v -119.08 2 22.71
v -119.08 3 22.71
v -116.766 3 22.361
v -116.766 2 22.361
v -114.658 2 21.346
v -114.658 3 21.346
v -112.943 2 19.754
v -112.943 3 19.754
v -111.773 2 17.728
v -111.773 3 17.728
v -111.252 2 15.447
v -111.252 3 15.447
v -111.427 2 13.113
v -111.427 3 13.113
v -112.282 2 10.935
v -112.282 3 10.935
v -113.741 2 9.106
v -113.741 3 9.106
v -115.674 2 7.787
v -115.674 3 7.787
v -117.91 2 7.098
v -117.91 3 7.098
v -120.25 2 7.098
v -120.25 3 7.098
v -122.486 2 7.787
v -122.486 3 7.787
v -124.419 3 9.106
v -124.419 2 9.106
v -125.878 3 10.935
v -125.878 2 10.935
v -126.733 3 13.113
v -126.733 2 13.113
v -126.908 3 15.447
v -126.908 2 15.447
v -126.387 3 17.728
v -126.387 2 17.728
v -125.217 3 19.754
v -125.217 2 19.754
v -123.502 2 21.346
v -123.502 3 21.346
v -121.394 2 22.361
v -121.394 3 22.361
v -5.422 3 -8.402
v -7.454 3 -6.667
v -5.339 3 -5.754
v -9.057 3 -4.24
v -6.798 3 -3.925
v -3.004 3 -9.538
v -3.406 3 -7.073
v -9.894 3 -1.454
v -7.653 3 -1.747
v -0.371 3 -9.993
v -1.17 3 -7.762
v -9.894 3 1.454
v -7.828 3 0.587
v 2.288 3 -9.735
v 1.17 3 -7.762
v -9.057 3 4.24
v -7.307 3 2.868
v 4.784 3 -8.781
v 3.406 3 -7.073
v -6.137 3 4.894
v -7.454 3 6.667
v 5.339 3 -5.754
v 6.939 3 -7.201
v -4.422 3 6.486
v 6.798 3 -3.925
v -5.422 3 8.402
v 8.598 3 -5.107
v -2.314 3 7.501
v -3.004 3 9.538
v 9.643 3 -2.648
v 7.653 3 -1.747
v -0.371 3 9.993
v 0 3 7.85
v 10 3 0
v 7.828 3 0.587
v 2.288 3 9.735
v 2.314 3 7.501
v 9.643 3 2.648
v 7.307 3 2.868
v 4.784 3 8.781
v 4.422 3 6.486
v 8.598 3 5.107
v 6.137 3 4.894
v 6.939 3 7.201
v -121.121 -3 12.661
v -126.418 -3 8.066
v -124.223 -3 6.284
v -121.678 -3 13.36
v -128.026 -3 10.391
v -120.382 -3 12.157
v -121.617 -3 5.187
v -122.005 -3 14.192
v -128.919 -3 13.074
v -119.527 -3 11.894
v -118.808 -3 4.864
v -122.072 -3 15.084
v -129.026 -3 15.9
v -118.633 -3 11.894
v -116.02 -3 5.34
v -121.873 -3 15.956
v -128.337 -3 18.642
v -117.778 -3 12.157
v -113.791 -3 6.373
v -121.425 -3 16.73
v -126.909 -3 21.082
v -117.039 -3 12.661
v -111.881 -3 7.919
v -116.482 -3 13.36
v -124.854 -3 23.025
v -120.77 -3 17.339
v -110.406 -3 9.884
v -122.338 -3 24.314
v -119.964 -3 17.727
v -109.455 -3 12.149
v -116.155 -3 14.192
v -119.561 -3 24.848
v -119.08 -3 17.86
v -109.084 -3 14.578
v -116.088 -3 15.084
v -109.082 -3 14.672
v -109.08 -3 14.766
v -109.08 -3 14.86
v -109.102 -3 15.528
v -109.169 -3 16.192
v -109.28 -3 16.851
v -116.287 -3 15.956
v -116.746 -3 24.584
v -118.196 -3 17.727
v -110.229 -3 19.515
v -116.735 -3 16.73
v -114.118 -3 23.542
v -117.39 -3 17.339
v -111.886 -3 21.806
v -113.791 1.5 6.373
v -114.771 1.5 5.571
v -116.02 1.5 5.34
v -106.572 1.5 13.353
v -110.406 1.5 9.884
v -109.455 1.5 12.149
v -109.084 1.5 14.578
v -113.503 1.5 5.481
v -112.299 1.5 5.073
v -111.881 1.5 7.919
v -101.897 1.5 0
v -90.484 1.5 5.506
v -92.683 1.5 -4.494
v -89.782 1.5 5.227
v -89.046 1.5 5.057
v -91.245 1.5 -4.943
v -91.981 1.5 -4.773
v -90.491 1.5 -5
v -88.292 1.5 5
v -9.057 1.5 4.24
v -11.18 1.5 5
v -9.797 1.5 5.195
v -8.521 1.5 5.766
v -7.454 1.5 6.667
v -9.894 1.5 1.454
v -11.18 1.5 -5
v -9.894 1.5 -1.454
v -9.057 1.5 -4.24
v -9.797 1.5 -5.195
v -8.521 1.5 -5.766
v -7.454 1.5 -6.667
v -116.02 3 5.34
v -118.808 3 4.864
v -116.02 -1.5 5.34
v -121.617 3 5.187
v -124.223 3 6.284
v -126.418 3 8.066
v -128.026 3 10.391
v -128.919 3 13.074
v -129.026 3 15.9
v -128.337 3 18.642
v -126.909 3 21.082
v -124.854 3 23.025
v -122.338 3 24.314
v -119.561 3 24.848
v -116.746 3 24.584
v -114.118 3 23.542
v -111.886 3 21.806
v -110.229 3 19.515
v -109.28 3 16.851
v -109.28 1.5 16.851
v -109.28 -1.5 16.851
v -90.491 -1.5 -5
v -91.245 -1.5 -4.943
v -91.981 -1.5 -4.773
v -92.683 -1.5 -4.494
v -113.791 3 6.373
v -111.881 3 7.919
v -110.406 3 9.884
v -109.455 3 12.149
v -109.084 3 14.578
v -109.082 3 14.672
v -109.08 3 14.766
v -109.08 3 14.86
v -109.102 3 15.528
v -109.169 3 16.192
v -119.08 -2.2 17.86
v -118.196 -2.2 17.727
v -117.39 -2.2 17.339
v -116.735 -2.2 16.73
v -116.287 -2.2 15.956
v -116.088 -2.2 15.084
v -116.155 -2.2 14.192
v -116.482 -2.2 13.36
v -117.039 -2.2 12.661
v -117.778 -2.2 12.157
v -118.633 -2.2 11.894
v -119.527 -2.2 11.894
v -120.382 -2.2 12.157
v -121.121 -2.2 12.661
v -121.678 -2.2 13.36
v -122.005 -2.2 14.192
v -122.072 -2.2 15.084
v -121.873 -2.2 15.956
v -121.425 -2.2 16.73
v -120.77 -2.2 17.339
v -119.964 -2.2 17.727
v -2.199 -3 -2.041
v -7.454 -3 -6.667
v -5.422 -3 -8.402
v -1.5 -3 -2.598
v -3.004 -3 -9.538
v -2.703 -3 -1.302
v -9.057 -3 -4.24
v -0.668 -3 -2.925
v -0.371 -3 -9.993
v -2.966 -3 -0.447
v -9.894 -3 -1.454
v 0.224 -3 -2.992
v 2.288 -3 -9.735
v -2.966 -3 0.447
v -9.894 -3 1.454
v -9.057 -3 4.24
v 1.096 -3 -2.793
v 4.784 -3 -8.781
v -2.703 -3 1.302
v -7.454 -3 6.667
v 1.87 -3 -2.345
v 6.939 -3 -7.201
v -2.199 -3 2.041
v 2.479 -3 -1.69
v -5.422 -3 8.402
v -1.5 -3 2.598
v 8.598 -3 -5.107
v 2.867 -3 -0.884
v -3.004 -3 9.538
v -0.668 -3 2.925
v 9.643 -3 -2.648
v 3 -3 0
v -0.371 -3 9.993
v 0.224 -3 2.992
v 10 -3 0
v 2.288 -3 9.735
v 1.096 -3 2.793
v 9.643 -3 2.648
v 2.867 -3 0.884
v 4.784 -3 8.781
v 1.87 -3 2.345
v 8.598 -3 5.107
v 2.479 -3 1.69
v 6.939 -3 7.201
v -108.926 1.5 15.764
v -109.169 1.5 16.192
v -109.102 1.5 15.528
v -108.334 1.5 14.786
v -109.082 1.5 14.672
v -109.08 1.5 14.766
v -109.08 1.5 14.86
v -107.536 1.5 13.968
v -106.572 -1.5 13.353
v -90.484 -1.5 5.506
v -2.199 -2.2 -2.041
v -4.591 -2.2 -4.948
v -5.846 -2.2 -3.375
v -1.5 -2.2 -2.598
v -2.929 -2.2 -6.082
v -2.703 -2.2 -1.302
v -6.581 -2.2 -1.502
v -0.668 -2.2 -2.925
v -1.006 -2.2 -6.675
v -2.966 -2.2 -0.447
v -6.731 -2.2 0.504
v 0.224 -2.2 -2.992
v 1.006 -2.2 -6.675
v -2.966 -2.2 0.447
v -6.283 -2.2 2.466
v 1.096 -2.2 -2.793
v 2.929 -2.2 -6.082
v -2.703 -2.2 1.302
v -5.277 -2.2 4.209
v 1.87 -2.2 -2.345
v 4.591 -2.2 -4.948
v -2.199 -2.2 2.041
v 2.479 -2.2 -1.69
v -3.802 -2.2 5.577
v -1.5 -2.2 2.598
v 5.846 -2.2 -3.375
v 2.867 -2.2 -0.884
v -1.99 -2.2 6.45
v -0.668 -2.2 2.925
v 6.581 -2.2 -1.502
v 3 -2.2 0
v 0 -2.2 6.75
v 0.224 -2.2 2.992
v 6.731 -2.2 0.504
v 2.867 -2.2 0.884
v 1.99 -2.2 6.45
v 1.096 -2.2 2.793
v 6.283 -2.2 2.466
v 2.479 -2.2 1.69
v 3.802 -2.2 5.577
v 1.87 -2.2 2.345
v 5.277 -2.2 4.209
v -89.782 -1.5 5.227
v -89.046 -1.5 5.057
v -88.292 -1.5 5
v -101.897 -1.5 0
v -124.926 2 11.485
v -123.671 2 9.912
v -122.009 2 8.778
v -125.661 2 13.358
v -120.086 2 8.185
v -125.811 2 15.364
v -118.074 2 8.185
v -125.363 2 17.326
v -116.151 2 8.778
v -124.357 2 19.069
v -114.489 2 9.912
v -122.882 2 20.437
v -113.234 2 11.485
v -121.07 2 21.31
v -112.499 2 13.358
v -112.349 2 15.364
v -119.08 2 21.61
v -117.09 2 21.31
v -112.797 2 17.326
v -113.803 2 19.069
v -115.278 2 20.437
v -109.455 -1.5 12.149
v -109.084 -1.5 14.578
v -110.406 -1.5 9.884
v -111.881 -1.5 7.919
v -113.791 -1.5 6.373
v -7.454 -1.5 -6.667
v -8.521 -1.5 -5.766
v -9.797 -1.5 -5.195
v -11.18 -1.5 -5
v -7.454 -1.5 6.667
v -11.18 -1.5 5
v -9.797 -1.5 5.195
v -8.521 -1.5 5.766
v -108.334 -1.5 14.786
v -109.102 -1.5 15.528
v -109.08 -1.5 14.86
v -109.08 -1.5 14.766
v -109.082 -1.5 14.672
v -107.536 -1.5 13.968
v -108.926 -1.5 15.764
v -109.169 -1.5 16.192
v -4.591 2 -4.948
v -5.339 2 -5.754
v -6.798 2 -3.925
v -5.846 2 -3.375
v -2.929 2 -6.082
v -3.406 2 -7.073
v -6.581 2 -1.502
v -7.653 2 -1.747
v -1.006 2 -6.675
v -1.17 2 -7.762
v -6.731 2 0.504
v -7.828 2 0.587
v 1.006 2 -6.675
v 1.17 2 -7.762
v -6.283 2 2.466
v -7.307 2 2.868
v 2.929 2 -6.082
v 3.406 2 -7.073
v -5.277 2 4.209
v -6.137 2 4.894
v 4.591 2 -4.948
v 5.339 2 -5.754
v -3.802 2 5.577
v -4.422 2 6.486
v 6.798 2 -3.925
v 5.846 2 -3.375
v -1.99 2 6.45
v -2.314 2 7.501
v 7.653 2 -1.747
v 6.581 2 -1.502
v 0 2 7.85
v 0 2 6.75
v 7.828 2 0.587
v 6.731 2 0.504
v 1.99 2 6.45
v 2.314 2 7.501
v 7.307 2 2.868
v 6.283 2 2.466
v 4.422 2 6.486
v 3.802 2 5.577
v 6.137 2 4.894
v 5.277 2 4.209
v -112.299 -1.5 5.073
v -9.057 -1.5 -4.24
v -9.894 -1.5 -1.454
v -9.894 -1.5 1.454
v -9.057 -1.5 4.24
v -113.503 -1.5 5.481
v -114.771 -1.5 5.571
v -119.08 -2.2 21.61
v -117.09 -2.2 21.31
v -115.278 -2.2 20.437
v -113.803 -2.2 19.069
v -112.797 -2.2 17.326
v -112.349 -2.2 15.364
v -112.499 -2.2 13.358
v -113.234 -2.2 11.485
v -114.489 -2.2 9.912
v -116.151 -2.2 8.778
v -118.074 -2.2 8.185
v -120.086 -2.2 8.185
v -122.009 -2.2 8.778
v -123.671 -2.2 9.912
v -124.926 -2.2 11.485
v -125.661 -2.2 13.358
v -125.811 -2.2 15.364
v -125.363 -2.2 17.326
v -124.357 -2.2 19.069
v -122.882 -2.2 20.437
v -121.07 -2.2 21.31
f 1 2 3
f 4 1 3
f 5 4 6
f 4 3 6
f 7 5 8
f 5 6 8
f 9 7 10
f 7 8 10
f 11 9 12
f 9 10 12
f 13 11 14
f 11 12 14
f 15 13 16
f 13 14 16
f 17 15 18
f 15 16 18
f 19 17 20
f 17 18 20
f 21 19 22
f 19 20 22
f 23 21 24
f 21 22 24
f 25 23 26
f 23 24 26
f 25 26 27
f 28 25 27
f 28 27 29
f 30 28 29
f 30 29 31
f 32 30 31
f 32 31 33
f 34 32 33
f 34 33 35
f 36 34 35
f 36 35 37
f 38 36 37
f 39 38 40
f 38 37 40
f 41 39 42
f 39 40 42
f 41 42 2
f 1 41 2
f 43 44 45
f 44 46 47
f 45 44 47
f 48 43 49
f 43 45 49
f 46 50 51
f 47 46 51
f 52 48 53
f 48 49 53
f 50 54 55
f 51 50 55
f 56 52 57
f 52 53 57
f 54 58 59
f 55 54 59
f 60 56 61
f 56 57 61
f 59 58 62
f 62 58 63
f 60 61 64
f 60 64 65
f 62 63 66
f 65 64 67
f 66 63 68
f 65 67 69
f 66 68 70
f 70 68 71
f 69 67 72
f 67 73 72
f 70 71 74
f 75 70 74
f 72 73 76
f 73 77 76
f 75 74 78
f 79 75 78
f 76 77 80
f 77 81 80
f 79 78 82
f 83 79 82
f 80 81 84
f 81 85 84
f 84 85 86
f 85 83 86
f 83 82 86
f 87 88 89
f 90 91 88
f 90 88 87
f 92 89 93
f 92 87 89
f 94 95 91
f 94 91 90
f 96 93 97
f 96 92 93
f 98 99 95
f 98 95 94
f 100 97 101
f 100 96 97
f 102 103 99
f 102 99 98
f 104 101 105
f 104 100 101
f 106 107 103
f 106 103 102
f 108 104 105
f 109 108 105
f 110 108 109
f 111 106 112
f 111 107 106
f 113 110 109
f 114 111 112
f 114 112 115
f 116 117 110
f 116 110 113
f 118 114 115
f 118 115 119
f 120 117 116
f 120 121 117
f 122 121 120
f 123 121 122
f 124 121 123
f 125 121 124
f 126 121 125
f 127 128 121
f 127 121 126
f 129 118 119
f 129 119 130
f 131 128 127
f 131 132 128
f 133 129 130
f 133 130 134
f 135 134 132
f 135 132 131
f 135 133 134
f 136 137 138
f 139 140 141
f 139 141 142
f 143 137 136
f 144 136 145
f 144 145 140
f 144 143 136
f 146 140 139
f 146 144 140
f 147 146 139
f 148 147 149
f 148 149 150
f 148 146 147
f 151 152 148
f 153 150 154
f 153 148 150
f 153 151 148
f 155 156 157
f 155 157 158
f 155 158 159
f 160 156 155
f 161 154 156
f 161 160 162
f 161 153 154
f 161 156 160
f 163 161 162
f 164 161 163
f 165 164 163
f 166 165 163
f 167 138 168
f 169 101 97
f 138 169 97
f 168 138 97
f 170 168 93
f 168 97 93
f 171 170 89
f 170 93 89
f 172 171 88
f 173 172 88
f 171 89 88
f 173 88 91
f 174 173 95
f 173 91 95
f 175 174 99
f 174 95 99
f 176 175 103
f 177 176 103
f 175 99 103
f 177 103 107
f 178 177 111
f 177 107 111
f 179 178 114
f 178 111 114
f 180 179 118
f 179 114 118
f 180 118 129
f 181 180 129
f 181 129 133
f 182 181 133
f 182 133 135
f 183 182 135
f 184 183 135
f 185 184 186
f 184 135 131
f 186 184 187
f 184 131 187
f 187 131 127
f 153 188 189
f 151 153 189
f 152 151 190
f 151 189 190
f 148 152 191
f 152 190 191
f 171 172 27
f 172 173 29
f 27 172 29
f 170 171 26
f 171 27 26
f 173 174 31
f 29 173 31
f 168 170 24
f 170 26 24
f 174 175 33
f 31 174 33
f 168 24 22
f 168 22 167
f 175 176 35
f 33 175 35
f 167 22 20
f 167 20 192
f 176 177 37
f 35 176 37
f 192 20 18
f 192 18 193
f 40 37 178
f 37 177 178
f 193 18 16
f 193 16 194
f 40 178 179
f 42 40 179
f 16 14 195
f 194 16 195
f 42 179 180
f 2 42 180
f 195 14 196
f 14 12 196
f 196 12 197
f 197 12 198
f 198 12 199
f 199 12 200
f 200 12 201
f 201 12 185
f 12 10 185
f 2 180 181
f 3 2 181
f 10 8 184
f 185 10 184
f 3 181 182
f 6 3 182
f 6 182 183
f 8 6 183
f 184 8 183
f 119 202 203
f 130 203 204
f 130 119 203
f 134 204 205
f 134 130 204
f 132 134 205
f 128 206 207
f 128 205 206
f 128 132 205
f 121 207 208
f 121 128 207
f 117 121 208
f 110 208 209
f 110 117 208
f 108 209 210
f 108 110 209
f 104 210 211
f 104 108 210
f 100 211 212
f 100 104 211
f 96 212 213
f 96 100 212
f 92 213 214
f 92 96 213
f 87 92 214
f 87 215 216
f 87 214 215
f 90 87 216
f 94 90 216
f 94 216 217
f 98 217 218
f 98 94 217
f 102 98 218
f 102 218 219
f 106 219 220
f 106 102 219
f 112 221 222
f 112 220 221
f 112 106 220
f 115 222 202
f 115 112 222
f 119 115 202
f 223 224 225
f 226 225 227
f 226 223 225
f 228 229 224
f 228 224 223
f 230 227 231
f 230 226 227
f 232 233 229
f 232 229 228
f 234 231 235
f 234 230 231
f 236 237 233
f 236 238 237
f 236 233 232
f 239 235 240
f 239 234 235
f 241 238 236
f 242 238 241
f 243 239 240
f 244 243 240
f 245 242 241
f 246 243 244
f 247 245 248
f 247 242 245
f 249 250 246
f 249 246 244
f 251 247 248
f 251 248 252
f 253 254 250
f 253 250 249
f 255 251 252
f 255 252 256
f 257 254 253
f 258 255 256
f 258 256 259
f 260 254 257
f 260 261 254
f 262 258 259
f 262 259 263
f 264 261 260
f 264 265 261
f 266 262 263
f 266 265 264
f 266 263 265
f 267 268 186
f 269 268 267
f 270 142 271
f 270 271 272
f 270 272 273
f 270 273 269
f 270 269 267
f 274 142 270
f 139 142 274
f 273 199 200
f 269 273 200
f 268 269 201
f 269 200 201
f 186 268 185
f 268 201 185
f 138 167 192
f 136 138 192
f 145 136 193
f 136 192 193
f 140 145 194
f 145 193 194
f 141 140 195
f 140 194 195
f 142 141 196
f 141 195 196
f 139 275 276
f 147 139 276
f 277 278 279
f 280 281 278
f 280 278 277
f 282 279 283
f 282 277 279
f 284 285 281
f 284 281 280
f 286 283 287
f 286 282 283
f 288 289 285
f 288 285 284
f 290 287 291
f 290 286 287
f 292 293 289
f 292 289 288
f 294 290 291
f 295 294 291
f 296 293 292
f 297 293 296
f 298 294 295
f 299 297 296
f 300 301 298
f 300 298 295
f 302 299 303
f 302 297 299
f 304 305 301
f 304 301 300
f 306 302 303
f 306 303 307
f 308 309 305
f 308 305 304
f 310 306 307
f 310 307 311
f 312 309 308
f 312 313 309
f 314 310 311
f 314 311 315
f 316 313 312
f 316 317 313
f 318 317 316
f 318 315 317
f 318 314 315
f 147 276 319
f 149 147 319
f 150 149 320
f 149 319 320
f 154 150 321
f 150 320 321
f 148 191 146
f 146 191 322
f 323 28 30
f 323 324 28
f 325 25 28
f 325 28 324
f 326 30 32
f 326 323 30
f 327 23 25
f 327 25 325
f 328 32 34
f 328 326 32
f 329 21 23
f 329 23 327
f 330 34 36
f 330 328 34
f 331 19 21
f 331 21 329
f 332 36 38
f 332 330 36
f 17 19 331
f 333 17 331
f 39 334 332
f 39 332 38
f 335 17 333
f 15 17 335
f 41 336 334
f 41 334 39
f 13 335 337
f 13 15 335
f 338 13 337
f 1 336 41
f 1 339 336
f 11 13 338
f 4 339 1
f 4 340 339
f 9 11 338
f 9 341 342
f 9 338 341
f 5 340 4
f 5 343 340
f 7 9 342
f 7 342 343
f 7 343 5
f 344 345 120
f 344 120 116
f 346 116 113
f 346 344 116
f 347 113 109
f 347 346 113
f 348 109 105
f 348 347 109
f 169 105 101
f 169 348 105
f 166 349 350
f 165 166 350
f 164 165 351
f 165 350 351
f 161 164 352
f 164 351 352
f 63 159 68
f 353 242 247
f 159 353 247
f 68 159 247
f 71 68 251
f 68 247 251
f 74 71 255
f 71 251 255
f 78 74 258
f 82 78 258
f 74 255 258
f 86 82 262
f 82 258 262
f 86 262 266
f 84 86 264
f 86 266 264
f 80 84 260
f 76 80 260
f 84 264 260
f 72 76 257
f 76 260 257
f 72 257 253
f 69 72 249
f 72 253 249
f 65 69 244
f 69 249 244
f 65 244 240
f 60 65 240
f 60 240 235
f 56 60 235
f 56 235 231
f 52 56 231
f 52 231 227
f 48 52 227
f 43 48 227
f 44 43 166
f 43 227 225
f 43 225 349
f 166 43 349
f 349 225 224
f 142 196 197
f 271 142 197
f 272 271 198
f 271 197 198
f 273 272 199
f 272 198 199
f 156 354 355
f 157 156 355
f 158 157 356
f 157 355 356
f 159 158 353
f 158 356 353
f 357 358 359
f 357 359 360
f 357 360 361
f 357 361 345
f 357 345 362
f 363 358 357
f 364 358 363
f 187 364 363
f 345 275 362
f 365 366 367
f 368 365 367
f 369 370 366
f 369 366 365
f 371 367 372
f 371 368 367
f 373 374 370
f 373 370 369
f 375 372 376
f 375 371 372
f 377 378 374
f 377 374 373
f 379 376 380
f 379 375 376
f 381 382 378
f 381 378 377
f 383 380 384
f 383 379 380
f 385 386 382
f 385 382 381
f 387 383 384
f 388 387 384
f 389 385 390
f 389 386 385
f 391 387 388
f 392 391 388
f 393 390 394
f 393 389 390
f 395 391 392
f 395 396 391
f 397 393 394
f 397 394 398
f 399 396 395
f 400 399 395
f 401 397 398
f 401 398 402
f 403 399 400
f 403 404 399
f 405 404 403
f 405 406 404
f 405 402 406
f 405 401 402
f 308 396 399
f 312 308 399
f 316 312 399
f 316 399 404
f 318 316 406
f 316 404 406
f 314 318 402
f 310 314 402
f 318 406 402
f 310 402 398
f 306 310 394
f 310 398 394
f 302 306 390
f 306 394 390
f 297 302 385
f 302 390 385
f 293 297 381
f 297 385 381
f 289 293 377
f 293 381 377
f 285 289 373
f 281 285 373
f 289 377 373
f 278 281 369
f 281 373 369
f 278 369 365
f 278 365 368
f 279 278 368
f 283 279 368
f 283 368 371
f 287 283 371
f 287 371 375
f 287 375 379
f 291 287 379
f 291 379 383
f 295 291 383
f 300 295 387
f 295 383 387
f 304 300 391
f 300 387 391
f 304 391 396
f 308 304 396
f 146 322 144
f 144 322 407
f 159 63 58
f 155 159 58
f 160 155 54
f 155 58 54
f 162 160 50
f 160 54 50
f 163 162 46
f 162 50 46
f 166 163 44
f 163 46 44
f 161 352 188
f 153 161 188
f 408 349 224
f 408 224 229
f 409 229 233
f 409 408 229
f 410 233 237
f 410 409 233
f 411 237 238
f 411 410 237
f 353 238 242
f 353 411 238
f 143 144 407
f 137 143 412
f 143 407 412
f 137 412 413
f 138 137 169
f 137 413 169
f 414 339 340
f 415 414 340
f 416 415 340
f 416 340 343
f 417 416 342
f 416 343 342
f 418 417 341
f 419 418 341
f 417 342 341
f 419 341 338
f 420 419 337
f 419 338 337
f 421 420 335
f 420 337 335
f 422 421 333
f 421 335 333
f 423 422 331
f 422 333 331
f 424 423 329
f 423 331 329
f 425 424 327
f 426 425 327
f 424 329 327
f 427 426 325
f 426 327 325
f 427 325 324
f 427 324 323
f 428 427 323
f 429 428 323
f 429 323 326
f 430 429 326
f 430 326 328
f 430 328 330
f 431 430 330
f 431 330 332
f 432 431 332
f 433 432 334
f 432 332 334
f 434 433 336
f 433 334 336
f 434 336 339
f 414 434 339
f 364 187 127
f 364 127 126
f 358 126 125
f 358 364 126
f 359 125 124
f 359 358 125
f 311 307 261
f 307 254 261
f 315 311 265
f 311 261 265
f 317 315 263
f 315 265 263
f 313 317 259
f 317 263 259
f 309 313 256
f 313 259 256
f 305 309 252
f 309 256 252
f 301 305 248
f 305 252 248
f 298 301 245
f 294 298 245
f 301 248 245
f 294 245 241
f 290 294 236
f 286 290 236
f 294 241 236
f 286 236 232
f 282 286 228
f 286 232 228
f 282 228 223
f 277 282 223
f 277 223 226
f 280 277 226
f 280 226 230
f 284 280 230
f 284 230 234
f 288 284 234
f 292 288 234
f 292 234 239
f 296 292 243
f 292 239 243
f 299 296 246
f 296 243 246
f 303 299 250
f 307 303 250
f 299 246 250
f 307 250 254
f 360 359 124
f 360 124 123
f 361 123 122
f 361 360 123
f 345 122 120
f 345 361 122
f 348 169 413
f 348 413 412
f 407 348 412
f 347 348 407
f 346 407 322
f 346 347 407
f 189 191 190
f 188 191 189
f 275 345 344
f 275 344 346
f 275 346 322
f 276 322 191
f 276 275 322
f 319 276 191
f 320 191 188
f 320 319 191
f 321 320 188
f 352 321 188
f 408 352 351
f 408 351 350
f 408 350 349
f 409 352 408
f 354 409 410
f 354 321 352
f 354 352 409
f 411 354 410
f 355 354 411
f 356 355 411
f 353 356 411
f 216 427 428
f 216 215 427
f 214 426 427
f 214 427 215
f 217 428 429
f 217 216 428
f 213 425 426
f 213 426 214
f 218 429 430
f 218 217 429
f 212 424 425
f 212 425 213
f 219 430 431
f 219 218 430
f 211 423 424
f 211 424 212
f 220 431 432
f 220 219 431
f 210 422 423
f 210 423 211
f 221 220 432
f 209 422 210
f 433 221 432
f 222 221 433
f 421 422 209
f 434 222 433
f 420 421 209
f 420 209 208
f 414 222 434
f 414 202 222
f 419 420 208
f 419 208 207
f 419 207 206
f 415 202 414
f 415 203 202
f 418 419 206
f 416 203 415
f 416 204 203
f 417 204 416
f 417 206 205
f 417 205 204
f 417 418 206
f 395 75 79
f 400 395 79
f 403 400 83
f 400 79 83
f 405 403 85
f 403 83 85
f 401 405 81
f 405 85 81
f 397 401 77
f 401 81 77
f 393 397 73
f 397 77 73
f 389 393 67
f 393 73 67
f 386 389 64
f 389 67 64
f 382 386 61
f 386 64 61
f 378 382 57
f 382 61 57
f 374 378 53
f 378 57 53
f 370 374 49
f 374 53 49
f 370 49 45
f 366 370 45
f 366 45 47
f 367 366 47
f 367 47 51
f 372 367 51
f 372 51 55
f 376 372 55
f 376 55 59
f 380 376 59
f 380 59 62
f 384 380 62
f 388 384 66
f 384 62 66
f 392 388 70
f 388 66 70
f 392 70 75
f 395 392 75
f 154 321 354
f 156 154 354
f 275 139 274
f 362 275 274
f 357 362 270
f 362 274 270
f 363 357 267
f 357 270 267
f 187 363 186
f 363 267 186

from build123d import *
from build123d.topology import SkipClean

# Parameters (mm, degrees)
SKETCH1_R           = 7.85
SKETCH1_R_2         = 3
BOSS_EXTRUDE1_DEPTH = 3
BOSS_EXTRUDE2_START = -6
BOSS_EXTRUDE2_DEPTH = 6
CUT_EXTRUDE1_DEPTH  = 1.5
CUT_EXTRUDE3_START  = -1.5
CUT_EXTRUDE3_DEPTH  = 1.5
SKETCH6_R           = 7.85
CUT_EXTRUDE4_DEPTH  = 1
SKETCH7_R           = 6.75
CUT_EXTRUDE5_DEPTH  = 4.2


with BuildPart() as part:
    # Sketch1 → Boss-Extrude1 (new, symmetric)
    # profile 1 of 7: a face of its own
    with BuildSketch(Plane(origin=(0, 0, 0), x_dir=(1, 0, 0), z_dir=(0, 1, 0))):
        with BuildLine():
            Line((10, 0), (7.85, 0))
            ThreePointArc((7.85, 0), (0, -7.85), (-7.85, 0))
            Line((-7.85, 0), (-101.897208147, 0))
            Line((-101.897208147, 0), (-112.298830122, -5.073262344))
            ThreePointArc((-112.298830122, -5.073262344), (-114.133881847, -5.566552555), (-116.020469414, -5.339534014))
            ThreePointArc((-116.020469414, -5.339534014), (-127.076790304, -20.864277212), (-109.083980094, -14.577890036))
            Line((-109.083980094, -14.577890036), (-90.484120267, -5.506038677))
            ThreePointArc((-90.484120267, -5.506038677), (-89.41701144, -5.128151962), (-88.292246268, -5))
            Line((-88.292246268, -5), (-11.180339887, -5))
            ThreePointArc((-11.180339887, -5), (-9.139098435, -5.435645354), (-7.453559925, -6.666666667))
            ThreePointArc((-7.453559925, -6.666666667), (3.568220898, -9.34172359), (10, 0))
        make_face()
        with Locations((-119.08, -14.86)):
            Circle(SKETCH1_R, mode=Mode.SUBTRACT)
    # profile 2 of 7: a face of its own
    with BuildSketch(Plane(origin=(0, 0, 0), x_dir=(1, 0, 0), z_dir=(0, 1, 0))):
        with Locations((-119.08, -14.86)):
            Circle(SKETCH1_R)
        with Locations(Location((-119.08, -14.86, 0), (0, 0, 270))):
            Circle(SKETCH1_R_2, mode=Mode.SUBTRACT)
    # profile 3 of 7: a face of its own
    with BuildSketch(Plane(origin=(0, 0, 0), x_dir=(1, 0, 0), z_dir=(0, 1, 0))):
        with BuildLine():
            ThreePointArc((-7.85, 0), (0, 7.85), (7.85, 0))
            Line((7.85, 0), (10, 0))
            ThreePointArc((10, 0), (3.568220898, 9.34172359), (-7.453559925, 6.666666667))
            ThreePointArc((-7.453559925, 6.666666667), (-9.139098435, 5.435645354), (-11.180339887, 5))
            Line((-11.180339887, 5), (-90.491443028, 5))
            ThreePointArc((-90.491443028, 5), (-91.616208201, 4.871848038), (-92.683317027, 4.493961323))
            Line((-92.683317027, 4.493961323), (-101.897208147, 0))
            Line((-101.897208147, 0), (-7.85, 0))
        make_face()
    # profile 4 of 7: a face of its own
    with BuildSketch(Plane(origin=(0, 0, 0), x_dir=(1, 0, 0), z_dir=(0, 1, 0))):
        with BuildLine():
            ThreePointArc((-3, 0), (0, 3), (3, 0))
            Line((3, 0), (7.85, 0))
            ThreePointArc((7.85, 0), (0, 7.85), (-7.85, 0))
            Line((-7.85, 0), (-3, 0))
        make_face()
    # profile 5 of 7: a face of its own
    with BuildSketch(Plane(origin=(0, 0, 0), x_dir=(1, 0, 0), z_dir=(0, 1, 0))):
        with BuildLine():
            Line((7.85, 0), (3, 0))
            ThreePointArc((3, 0), (0, -3), (-3, 0))
            Line((-3, 0), (-7.85, 0))
            ThreePointArc((-7.85, 0), (0, -7.85), (7.85, 0))
        make_face()
    # profile 6 of 7: a face of its own
    with BuildSketch(Plane(origin=(0, 0, 0), x_dir=(1, 0, 0), z_dir=(0, 1, 0))):
        with BuildLine():
            ThreePointArc((-3, 0), (0, 3), (3, 0))
            Line((3, 0), (7.85, 0))
            ThreePointArc((7.85, 0), (0, 7.85), (-7.85, 0))
            Line((-7.85, 0), (-3, 0))
        make_face()
    # profile 7 of 7: a face of its own
    with BuildSketch(Plane(origin=(0, 0, 0), x_dir=(1, 0, 0), z_dir=(0, 1, 0))):
        with BuildLine():
            Line((7.85, 0), (3, 0))
            ThreePointArc((3, 0), (0, -3), (-3, 0))
            Line((-3, 0), (-7.85, 0))
            ThreePointArc((-7.85, 0), (0, -7.85), (7.85, 0))
        make_face()
    extrude(amount=BOSS_EXTRUDE1_DEPTH, both=True)

    # Sketch3 → Boss-Extrude2 (add)
    with BuildSketch(Plane.XZ.offset(3).offset(BOSS_EXTRUDE2_START)):
        with BuildLine():
            Line((-109.083980094, 14.577890036), (-106.572243843, 13.352821776))
            ThreePointArc((-106.572243843, 13.352821776), (-108.334212899, 14.786207157), (-109.280246563, 16.851188733))
            ThreePointArc((-109.280246563, 16.851188733), (-109.117062064, 15.720155621), (-109.083980094, 14.577890036))
        make_face()
        with BuildLine():
            Line((-109.737977242, 15.328711334), (-109.083980094, 14.577890036))
            ThreePointArc((-109.083980094, 14.577890036), (-109.117062064, 15.720155621), (-109.280246563, 16.851188733))
            Line((-109.280246563, 16.851188733), (-109.737977242, 15.328711334))
        make_face()
    extrude(amount=BOSS_EXTRUDE2_DEPTH)

    # Sketch4 → Cut-Extrude1 (cut)
    with SkipClean():  # the faces are left unmerged after this step: merging them gives an invalid solid
        with BuildSketch(Plane(origin=(0, 3, 0), x_dir=(1, 0, 0), z_dir=(0, 1, 0))):
            with BuildLine():
                ThreePointArc((-7.453559925, 6.666666667), (-9.139098435, 5.435645354), (-11.180339887, 5))
                Line((-11.180339887, 5), (-90.491443028, 5))
                ThreePointArc((-90.491443028, 5), (-91.616208201, 4.871848038), (-92.683317027, 4.493961323))
                Line((-92.683317027, 4.493961323), (-112.298830122, -5.073262344))
                ThreePointArc((-112.298830122, -5.073262344), (-114.133881847, -5.566552555), (-116.020469414, -5.339534014))
                ThreePointArc((-116.020469414, -5.339534014), (-111.083209696, -8.855722788), (-109.083980094, -14.577890036))
                Line((-109.083980094, -14.577890036), (-106.572243843, -13.352821776))
                Line((-106.572243843, -13.352821776), (-90.484120267, -5.506038677))
                ThreePointArc((-90.484120267, -5.506038677), (-89.41701144, -5.128151962), (-88.292246268, -5))
                Line((-88.292246268, -5), (-11.180339887, -5))
                ThreePointArc((-11.180339887, -5), (-9.139098435, -5.435645354), (-7.453559925, -6.666666667))
                ThreePointArc((-7.453559925, -6.666666667), (-10, 0), (-7.453559925, 6.666666667))
            make_face()
            with BuildLine():
                Line((-106.572243843, -13.352821776), (-109.083980094, -14.577890036))
                ThreePointArc((-109.083980094, -14.577890036), (-109.080995073, -14.718930981), (-109.08, -14.86))
                ThreePointArc((-109.08, -14.86), (-109.13018758, -15.860616217), (-109.280246563, -16.851188733))
                ThreePointArc((-109.280246563, -16.851188733), (-108.334212899, -14.786207157), (-106.572243843, -13.352821776))
            make_face()
        extrude(amount=-CUT_EXTRUDE1_DEPTH, mode=Mode.SUBTRACT)

    # Sketch5 → Cut-Extrude3 (cut)
    with SkipClean():  # the faces are left unmerged after this step: merging them gives an invalid solid
        with BuildSketch(Plane.XZ.offset(3).offset(CUT_EXTRUDE3_START)):
            with BuildLine():
                ThreePointArc((-106.572243843, 13.352821776), (-108.334212899, 14.786207157), (-109.280246563, 16.851188733))
                ThreePointArc((-109.280246563, 16.851188733), (-109.13018758, 15.860616217), (-109.08, 14.86))
                ThreePointArc((-109.08, 14.86), (-109.080995073, 14.718930981), (-109.083980094, 14.577890036))
                Line((-109.083980094, 14.577890036), (-106.572243843, 13.352821776))
            make_face()
            with BuildLine():
                Line((-90.491443028, -5), (-11.180339887, -5))
                ThreePointArc((-11.180339887, -5), (-9.139098435, -5.435645354), (-7.453559925, -6.666666667))
                ThreePointArc((-7.453559925, -6.666666667), (-10, 0), (-7.453559925, 6.666666667))
                ThreePointArc((-7.453559925, 6.666666667), (-9.139098435, 5.435645354), (-11.180339887, 5))
                Line((-11.180339887, 5), (-88.292246268, 5))
                ThreePointArc((-88.292246268, 5), (-89.41701144, 5.128151962), (-90.484120267, 5.506038677))
                Line((-90.484120267, 5.506038677), (-106.572243843, 13.352821776))
                Line((-106.572243843, 13.352821776), (-109.083980094, 14.577890036))
                ThreePointArc((-109.083980094, 14.577890036), (-111.083209696, 8.855722788), (-116.020469414, 5.339534014))
                ThreePointArc((-116.020469414, 5.339534014), (-114.133881847, 5.566552555), (-112.298830122, 5.073262344))
                Line((-112.298830122, 5.073262344), (-92.683317027, -4.493961323))
                ThreePointArc((-92.683317027, -4.493961323), (-91.616208201, -4.871848038), (-90.491443028, -5))
            make_face()
        extrude(amount=CUT_EXTRUDE3_DEPTH, mode=Mode.SUBTRACT)

    # Sketch6 → Cut-Extrude4 (cut)
    with SkipClean():  # the faces are left unmerged after this step: merging them gives an invalid solid
        with BuildSketch(Plane(origin=(0, 3, 0), x_dir=(1, 0, 0), z_dir=(0, 1, 0))):
            with Locations(Location((-119.08, -14.86, 0), (0, 0, 270))):
                Circle(SKETCH6_R)
            with Locations(Location((0, 0, 0), (0, 0, 270))):
                Circle(SKETCH6_R)
        extrude(amount=-CUT_EXTRUDE4_DEPTH, mode=Mode.SUBTRACT)

    # Sketch7 → Cut-Extrude5 (cut)
    with SkipClean():  # the faces are left unmerged after this step: merging them gives an invalid solid
        with BuildSketch(Plane(origin=(0, 2, 0), x_dir=(1, 0, 0), z_dir=(0, 1, 0))):
            with Locations(Location((-119.08, -14.86, 0), (0, 0, 270))):
                Circle(SKETCH7_R)
            with Locations(Location((0, 0, 0), (0, 0, 270))):
                Circle(SKETCH7_R)
        extrude(amount=-CUT_EXTRUDE5_DEPTH, mode=Mode.SUBTRACT)


solid = part.part
